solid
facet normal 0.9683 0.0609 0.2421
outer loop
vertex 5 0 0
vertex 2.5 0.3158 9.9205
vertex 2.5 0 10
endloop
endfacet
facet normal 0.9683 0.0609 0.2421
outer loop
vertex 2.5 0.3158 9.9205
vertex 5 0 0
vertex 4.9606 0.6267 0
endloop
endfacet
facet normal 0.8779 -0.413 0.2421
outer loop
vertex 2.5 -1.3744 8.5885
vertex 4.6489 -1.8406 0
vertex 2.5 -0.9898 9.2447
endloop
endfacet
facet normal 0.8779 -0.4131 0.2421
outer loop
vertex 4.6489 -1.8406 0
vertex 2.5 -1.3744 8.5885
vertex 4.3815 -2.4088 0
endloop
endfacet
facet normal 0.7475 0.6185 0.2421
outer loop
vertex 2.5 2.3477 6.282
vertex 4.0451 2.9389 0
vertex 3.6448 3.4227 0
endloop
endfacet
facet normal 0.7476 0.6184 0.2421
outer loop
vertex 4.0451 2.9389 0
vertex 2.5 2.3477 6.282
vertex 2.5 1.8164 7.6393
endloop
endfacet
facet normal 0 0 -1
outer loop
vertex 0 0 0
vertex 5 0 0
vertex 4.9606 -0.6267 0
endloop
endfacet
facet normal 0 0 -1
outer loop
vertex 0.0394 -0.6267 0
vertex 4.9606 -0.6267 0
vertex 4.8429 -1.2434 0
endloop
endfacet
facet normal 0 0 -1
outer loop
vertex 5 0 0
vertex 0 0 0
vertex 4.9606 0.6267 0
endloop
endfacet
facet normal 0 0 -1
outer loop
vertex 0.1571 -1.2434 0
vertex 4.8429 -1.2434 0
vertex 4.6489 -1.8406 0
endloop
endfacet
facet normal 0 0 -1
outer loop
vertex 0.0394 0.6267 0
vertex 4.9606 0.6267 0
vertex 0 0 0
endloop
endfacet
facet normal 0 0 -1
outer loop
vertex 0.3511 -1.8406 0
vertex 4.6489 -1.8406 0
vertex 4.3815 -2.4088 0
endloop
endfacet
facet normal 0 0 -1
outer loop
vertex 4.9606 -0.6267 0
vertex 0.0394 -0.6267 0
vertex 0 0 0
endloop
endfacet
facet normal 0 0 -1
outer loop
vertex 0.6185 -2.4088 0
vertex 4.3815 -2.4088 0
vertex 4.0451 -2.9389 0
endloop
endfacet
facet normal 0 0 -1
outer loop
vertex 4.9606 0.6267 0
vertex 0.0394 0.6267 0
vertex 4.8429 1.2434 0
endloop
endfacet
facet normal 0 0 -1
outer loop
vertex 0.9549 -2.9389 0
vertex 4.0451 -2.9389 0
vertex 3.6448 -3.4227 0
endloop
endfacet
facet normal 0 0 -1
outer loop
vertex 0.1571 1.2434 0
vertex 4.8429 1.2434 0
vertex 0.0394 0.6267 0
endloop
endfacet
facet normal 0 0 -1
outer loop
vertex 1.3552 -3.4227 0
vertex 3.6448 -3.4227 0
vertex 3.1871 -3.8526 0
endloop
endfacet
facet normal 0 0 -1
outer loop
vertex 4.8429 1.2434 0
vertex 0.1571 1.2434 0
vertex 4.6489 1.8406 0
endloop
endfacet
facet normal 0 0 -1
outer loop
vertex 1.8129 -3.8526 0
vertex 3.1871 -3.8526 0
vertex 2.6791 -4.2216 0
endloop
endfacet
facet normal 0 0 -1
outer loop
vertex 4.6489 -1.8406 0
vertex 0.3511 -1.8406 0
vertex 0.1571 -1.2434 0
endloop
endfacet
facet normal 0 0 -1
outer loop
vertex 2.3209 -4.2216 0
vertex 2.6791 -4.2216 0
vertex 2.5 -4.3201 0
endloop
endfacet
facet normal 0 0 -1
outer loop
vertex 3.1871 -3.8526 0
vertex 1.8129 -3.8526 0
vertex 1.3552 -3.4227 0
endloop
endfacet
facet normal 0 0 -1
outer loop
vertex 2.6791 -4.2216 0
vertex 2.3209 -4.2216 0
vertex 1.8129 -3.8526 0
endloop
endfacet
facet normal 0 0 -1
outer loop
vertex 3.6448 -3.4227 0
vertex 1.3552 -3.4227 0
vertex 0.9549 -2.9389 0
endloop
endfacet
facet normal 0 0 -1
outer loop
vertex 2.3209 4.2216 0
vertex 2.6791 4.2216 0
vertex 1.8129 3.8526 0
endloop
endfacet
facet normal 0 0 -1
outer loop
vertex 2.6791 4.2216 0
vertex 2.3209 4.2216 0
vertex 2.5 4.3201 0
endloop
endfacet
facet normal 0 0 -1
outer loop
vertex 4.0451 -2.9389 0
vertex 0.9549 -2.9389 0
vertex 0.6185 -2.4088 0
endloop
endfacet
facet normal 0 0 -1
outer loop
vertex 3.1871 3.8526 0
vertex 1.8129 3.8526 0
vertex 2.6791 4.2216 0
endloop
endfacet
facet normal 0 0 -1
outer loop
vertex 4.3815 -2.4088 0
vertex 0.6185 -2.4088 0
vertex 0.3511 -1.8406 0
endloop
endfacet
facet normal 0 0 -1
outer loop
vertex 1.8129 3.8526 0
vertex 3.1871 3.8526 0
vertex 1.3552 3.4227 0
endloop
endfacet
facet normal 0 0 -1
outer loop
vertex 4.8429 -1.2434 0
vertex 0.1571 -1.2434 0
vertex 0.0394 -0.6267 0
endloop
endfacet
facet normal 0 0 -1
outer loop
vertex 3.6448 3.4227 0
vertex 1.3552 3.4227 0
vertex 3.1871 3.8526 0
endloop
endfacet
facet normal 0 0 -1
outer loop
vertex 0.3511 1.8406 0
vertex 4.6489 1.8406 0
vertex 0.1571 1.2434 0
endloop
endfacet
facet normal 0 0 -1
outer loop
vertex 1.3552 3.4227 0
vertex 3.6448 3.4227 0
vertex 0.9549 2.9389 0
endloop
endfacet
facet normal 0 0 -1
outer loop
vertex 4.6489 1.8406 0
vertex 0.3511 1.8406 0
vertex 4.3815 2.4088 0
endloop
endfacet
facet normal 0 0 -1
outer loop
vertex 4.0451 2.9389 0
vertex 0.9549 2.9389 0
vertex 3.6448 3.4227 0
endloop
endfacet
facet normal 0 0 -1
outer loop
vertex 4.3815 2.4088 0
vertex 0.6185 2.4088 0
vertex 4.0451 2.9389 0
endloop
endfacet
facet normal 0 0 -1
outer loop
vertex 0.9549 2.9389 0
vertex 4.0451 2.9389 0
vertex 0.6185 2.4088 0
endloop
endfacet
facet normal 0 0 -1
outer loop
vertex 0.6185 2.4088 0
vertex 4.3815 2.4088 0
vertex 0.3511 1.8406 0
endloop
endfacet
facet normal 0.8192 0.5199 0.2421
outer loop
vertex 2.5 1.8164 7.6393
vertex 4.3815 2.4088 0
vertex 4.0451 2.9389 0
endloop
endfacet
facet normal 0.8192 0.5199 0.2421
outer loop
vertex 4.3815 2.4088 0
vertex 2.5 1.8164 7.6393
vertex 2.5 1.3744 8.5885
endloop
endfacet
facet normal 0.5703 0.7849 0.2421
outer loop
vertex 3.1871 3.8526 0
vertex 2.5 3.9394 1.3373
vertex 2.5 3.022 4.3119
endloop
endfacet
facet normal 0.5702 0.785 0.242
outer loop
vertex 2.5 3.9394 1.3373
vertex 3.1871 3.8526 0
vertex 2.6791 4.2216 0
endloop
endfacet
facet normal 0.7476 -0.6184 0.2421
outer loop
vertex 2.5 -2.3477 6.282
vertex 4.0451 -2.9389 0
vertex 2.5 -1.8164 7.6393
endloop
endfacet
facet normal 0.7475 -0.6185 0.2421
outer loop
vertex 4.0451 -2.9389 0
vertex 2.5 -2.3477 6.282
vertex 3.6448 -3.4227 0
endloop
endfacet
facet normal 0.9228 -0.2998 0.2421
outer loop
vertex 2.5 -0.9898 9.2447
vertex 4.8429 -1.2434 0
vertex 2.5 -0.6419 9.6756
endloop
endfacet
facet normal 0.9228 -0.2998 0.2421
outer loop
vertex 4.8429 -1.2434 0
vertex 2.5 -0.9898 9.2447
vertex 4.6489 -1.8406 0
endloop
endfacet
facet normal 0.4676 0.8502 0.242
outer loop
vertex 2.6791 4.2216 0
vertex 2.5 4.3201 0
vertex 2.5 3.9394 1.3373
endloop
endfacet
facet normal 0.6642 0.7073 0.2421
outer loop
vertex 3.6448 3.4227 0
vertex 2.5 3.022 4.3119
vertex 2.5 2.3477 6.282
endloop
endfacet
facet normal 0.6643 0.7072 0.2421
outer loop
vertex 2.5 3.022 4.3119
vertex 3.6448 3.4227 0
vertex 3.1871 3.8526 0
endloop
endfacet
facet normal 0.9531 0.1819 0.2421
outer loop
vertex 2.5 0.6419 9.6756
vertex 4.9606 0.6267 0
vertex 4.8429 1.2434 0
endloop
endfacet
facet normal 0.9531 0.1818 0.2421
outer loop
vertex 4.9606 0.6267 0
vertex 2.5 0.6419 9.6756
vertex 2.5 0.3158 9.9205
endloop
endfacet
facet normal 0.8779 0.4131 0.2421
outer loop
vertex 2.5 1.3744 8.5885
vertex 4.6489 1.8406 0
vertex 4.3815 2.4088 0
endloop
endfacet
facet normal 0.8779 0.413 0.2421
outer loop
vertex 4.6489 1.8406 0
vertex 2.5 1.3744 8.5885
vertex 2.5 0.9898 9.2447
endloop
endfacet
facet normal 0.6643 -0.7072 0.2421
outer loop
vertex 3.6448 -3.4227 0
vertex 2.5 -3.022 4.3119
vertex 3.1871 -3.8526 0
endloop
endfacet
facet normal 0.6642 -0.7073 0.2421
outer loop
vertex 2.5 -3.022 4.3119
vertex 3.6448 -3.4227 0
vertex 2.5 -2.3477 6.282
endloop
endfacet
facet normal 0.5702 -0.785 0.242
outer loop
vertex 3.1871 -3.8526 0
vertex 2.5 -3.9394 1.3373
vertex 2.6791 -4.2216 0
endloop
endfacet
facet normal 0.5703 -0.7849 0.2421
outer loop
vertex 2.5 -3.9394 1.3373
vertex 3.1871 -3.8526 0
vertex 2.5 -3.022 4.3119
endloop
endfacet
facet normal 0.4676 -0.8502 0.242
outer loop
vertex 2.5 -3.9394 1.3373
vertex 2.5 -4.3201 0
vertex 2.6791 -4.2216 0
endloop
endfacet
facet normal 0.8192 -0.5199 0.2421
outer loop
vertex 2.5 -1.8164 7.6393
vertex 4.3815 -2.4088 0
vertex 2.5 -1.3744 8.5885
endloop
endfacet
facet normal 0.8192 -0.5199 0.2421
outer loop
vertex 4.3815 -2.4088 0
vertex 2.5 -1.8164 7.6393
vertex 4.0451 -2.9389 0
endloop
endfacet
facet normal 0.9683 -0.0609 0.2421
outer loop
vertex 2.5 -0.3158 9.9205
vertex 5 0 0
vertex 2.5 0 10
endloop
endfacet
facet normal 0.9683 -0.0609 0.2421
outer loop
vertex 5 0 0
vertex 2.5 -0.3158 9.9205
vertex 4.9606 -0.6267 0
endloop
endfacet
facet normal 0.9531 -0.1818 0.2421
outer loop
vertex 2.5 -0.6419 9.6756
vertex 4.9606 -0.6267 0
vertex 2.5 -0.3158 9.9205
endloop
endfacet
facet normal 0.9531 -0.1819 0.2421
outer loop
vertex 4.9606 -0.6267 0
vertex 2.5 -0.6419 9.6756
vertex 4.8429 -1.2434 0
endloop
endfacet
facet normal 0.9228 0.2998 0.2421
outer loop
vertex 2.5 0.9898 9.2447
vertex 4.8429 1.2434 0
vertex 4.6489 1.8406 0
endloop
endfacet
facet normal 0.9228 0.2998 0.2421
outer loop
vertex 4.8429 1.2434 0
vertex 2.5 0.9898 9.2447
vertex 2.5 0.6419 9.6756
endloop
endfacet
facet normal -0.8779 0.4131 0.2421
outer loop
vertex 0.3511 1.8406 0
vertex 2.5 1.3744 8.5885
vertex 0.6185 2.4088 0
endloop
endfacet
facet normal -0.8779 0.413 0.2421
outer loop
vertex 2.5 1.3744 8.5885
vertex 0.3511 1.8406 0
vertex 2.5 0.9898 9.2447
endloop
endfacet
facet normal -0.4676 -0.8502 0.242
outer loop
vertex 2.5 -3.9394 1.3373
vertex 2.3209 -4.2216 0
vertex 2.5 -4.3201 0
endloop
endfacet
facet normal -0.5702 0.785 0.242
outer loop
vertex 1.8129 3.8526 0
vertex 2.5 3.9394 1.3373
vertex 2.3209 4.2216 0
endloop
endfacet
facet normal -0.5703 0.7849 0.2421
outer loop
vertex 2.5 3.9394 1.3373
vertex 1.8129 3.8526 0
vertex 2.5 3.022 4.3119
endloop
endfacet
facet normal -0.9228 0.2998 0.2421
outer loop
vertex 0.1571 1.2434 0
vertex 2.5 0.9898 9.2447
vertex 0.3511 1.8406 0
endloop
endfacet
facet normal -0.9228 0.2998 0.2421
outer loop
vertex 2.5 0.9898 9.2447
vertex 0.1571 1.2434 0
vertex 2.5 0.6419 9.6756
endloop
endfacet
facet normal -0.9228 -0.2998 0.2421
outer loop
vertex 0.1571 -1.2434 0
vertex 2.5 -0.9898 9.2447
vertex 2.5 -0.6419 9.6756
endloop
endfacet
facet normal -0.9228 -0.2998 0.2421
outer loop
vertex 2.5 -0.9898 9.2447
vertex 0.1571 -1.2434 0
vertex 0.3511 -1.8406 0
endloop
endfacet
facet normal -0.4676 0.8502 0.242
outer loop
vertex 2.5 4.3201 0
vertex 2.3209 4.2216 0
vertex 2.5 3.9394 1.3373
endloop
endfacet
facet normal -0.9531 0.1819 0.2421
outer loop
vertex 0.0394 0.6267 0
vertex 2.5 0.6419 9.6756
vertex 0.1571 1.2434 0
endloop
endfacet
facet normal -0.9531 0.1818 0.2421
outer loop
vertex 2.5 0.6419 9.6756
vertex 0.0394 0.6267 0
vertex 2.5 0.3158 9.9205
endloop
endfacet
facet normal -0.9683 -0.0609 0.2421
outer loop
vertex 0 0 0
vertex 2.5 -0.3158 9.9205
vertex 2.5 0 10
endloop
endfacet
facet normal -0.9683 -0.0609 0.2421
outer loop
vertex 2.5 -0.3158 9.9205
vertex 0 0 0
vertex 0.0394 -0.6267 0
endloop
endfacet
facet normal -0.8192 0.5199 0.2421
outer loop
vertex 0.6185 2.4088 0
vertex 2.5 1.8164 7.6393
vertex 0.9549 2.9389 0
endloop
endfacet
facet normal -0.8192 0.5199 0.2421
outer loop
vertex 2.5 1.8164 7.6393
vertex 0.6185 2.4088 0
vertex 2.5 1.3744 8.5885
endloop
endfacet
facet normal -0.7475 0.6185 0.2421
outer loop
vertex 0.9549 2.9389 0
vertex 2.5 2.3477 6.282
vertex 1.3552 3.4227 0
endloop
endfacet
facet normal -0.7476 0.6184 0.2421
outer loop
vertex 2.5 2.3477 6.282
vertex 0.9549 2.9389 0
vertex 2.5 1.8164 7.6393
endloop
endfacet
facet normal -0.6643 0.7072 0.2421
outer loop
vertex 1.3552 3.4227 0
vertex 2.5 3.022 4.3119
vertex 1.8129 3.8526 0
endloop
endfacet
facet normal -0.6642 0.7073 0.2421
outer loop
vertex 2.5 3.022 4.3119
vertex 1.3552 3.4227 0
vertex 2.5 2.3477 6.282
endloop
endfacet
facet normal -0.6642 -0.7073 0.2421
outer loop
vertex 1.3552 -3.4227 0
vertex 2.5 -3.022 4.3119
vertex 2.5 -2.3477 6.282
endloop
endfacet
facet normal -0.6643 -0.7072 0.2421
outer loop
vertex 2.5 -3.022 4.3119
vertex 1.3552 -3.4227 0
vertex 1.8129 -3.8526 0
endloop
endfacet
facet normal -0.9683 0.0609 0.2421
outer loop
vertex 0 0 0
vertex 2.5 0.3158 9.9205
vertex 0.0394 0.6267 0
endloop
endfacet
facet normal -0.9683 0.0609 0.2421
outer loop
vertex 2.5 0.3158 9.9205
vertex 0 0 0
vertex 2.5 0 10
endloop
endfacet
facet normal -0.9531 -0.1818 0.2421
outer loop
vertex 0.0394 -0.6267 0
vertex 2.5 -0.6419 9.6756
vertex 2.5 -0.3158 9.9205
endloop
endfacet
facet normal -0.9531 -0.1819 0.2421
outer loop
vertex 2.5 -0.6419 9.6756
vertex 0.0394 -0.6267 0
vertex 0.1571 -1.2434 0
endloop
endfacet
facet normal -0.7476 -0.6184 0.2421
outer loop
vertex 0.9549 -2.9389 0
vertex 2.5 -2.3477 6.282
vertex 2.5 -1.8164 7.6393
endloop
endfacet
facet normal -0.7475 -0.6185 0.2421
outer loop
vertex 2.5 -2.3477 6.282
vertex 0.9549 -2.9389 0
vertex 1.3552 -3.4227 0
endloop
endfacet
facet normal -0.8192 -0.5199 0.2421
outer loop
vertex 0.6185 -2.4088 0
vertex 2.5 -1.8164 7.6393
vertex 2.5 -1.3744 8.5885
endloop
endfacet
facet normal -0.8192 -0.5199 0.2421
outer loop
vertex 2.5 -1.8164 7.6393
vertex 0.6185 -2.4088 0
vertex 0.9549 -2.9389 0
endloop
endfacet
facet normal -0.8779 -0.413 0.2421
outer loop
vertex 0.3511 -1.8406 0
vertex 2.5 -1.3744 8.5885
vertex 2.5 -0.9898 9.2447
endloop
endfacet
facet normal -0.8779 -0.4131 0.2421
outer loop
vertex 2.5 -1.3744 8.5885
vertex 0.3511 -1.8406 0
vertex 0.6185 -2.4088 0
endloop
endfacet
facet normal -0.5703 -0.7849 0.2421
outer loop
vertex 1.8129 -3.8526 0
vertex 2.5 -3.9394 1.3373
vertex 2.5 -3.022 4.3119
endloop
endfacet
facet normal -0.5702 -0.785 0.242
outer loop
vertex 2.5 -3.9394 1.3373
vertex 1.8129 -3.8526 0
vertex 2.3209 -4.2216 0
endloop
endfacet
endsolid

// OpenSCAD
$fn=50;
intersection() {
    cylinder(h=20, r1=5, r2=0);
    translate([5, 0, 0]) cylinder(h=20, r1=5, r2=0);
}
